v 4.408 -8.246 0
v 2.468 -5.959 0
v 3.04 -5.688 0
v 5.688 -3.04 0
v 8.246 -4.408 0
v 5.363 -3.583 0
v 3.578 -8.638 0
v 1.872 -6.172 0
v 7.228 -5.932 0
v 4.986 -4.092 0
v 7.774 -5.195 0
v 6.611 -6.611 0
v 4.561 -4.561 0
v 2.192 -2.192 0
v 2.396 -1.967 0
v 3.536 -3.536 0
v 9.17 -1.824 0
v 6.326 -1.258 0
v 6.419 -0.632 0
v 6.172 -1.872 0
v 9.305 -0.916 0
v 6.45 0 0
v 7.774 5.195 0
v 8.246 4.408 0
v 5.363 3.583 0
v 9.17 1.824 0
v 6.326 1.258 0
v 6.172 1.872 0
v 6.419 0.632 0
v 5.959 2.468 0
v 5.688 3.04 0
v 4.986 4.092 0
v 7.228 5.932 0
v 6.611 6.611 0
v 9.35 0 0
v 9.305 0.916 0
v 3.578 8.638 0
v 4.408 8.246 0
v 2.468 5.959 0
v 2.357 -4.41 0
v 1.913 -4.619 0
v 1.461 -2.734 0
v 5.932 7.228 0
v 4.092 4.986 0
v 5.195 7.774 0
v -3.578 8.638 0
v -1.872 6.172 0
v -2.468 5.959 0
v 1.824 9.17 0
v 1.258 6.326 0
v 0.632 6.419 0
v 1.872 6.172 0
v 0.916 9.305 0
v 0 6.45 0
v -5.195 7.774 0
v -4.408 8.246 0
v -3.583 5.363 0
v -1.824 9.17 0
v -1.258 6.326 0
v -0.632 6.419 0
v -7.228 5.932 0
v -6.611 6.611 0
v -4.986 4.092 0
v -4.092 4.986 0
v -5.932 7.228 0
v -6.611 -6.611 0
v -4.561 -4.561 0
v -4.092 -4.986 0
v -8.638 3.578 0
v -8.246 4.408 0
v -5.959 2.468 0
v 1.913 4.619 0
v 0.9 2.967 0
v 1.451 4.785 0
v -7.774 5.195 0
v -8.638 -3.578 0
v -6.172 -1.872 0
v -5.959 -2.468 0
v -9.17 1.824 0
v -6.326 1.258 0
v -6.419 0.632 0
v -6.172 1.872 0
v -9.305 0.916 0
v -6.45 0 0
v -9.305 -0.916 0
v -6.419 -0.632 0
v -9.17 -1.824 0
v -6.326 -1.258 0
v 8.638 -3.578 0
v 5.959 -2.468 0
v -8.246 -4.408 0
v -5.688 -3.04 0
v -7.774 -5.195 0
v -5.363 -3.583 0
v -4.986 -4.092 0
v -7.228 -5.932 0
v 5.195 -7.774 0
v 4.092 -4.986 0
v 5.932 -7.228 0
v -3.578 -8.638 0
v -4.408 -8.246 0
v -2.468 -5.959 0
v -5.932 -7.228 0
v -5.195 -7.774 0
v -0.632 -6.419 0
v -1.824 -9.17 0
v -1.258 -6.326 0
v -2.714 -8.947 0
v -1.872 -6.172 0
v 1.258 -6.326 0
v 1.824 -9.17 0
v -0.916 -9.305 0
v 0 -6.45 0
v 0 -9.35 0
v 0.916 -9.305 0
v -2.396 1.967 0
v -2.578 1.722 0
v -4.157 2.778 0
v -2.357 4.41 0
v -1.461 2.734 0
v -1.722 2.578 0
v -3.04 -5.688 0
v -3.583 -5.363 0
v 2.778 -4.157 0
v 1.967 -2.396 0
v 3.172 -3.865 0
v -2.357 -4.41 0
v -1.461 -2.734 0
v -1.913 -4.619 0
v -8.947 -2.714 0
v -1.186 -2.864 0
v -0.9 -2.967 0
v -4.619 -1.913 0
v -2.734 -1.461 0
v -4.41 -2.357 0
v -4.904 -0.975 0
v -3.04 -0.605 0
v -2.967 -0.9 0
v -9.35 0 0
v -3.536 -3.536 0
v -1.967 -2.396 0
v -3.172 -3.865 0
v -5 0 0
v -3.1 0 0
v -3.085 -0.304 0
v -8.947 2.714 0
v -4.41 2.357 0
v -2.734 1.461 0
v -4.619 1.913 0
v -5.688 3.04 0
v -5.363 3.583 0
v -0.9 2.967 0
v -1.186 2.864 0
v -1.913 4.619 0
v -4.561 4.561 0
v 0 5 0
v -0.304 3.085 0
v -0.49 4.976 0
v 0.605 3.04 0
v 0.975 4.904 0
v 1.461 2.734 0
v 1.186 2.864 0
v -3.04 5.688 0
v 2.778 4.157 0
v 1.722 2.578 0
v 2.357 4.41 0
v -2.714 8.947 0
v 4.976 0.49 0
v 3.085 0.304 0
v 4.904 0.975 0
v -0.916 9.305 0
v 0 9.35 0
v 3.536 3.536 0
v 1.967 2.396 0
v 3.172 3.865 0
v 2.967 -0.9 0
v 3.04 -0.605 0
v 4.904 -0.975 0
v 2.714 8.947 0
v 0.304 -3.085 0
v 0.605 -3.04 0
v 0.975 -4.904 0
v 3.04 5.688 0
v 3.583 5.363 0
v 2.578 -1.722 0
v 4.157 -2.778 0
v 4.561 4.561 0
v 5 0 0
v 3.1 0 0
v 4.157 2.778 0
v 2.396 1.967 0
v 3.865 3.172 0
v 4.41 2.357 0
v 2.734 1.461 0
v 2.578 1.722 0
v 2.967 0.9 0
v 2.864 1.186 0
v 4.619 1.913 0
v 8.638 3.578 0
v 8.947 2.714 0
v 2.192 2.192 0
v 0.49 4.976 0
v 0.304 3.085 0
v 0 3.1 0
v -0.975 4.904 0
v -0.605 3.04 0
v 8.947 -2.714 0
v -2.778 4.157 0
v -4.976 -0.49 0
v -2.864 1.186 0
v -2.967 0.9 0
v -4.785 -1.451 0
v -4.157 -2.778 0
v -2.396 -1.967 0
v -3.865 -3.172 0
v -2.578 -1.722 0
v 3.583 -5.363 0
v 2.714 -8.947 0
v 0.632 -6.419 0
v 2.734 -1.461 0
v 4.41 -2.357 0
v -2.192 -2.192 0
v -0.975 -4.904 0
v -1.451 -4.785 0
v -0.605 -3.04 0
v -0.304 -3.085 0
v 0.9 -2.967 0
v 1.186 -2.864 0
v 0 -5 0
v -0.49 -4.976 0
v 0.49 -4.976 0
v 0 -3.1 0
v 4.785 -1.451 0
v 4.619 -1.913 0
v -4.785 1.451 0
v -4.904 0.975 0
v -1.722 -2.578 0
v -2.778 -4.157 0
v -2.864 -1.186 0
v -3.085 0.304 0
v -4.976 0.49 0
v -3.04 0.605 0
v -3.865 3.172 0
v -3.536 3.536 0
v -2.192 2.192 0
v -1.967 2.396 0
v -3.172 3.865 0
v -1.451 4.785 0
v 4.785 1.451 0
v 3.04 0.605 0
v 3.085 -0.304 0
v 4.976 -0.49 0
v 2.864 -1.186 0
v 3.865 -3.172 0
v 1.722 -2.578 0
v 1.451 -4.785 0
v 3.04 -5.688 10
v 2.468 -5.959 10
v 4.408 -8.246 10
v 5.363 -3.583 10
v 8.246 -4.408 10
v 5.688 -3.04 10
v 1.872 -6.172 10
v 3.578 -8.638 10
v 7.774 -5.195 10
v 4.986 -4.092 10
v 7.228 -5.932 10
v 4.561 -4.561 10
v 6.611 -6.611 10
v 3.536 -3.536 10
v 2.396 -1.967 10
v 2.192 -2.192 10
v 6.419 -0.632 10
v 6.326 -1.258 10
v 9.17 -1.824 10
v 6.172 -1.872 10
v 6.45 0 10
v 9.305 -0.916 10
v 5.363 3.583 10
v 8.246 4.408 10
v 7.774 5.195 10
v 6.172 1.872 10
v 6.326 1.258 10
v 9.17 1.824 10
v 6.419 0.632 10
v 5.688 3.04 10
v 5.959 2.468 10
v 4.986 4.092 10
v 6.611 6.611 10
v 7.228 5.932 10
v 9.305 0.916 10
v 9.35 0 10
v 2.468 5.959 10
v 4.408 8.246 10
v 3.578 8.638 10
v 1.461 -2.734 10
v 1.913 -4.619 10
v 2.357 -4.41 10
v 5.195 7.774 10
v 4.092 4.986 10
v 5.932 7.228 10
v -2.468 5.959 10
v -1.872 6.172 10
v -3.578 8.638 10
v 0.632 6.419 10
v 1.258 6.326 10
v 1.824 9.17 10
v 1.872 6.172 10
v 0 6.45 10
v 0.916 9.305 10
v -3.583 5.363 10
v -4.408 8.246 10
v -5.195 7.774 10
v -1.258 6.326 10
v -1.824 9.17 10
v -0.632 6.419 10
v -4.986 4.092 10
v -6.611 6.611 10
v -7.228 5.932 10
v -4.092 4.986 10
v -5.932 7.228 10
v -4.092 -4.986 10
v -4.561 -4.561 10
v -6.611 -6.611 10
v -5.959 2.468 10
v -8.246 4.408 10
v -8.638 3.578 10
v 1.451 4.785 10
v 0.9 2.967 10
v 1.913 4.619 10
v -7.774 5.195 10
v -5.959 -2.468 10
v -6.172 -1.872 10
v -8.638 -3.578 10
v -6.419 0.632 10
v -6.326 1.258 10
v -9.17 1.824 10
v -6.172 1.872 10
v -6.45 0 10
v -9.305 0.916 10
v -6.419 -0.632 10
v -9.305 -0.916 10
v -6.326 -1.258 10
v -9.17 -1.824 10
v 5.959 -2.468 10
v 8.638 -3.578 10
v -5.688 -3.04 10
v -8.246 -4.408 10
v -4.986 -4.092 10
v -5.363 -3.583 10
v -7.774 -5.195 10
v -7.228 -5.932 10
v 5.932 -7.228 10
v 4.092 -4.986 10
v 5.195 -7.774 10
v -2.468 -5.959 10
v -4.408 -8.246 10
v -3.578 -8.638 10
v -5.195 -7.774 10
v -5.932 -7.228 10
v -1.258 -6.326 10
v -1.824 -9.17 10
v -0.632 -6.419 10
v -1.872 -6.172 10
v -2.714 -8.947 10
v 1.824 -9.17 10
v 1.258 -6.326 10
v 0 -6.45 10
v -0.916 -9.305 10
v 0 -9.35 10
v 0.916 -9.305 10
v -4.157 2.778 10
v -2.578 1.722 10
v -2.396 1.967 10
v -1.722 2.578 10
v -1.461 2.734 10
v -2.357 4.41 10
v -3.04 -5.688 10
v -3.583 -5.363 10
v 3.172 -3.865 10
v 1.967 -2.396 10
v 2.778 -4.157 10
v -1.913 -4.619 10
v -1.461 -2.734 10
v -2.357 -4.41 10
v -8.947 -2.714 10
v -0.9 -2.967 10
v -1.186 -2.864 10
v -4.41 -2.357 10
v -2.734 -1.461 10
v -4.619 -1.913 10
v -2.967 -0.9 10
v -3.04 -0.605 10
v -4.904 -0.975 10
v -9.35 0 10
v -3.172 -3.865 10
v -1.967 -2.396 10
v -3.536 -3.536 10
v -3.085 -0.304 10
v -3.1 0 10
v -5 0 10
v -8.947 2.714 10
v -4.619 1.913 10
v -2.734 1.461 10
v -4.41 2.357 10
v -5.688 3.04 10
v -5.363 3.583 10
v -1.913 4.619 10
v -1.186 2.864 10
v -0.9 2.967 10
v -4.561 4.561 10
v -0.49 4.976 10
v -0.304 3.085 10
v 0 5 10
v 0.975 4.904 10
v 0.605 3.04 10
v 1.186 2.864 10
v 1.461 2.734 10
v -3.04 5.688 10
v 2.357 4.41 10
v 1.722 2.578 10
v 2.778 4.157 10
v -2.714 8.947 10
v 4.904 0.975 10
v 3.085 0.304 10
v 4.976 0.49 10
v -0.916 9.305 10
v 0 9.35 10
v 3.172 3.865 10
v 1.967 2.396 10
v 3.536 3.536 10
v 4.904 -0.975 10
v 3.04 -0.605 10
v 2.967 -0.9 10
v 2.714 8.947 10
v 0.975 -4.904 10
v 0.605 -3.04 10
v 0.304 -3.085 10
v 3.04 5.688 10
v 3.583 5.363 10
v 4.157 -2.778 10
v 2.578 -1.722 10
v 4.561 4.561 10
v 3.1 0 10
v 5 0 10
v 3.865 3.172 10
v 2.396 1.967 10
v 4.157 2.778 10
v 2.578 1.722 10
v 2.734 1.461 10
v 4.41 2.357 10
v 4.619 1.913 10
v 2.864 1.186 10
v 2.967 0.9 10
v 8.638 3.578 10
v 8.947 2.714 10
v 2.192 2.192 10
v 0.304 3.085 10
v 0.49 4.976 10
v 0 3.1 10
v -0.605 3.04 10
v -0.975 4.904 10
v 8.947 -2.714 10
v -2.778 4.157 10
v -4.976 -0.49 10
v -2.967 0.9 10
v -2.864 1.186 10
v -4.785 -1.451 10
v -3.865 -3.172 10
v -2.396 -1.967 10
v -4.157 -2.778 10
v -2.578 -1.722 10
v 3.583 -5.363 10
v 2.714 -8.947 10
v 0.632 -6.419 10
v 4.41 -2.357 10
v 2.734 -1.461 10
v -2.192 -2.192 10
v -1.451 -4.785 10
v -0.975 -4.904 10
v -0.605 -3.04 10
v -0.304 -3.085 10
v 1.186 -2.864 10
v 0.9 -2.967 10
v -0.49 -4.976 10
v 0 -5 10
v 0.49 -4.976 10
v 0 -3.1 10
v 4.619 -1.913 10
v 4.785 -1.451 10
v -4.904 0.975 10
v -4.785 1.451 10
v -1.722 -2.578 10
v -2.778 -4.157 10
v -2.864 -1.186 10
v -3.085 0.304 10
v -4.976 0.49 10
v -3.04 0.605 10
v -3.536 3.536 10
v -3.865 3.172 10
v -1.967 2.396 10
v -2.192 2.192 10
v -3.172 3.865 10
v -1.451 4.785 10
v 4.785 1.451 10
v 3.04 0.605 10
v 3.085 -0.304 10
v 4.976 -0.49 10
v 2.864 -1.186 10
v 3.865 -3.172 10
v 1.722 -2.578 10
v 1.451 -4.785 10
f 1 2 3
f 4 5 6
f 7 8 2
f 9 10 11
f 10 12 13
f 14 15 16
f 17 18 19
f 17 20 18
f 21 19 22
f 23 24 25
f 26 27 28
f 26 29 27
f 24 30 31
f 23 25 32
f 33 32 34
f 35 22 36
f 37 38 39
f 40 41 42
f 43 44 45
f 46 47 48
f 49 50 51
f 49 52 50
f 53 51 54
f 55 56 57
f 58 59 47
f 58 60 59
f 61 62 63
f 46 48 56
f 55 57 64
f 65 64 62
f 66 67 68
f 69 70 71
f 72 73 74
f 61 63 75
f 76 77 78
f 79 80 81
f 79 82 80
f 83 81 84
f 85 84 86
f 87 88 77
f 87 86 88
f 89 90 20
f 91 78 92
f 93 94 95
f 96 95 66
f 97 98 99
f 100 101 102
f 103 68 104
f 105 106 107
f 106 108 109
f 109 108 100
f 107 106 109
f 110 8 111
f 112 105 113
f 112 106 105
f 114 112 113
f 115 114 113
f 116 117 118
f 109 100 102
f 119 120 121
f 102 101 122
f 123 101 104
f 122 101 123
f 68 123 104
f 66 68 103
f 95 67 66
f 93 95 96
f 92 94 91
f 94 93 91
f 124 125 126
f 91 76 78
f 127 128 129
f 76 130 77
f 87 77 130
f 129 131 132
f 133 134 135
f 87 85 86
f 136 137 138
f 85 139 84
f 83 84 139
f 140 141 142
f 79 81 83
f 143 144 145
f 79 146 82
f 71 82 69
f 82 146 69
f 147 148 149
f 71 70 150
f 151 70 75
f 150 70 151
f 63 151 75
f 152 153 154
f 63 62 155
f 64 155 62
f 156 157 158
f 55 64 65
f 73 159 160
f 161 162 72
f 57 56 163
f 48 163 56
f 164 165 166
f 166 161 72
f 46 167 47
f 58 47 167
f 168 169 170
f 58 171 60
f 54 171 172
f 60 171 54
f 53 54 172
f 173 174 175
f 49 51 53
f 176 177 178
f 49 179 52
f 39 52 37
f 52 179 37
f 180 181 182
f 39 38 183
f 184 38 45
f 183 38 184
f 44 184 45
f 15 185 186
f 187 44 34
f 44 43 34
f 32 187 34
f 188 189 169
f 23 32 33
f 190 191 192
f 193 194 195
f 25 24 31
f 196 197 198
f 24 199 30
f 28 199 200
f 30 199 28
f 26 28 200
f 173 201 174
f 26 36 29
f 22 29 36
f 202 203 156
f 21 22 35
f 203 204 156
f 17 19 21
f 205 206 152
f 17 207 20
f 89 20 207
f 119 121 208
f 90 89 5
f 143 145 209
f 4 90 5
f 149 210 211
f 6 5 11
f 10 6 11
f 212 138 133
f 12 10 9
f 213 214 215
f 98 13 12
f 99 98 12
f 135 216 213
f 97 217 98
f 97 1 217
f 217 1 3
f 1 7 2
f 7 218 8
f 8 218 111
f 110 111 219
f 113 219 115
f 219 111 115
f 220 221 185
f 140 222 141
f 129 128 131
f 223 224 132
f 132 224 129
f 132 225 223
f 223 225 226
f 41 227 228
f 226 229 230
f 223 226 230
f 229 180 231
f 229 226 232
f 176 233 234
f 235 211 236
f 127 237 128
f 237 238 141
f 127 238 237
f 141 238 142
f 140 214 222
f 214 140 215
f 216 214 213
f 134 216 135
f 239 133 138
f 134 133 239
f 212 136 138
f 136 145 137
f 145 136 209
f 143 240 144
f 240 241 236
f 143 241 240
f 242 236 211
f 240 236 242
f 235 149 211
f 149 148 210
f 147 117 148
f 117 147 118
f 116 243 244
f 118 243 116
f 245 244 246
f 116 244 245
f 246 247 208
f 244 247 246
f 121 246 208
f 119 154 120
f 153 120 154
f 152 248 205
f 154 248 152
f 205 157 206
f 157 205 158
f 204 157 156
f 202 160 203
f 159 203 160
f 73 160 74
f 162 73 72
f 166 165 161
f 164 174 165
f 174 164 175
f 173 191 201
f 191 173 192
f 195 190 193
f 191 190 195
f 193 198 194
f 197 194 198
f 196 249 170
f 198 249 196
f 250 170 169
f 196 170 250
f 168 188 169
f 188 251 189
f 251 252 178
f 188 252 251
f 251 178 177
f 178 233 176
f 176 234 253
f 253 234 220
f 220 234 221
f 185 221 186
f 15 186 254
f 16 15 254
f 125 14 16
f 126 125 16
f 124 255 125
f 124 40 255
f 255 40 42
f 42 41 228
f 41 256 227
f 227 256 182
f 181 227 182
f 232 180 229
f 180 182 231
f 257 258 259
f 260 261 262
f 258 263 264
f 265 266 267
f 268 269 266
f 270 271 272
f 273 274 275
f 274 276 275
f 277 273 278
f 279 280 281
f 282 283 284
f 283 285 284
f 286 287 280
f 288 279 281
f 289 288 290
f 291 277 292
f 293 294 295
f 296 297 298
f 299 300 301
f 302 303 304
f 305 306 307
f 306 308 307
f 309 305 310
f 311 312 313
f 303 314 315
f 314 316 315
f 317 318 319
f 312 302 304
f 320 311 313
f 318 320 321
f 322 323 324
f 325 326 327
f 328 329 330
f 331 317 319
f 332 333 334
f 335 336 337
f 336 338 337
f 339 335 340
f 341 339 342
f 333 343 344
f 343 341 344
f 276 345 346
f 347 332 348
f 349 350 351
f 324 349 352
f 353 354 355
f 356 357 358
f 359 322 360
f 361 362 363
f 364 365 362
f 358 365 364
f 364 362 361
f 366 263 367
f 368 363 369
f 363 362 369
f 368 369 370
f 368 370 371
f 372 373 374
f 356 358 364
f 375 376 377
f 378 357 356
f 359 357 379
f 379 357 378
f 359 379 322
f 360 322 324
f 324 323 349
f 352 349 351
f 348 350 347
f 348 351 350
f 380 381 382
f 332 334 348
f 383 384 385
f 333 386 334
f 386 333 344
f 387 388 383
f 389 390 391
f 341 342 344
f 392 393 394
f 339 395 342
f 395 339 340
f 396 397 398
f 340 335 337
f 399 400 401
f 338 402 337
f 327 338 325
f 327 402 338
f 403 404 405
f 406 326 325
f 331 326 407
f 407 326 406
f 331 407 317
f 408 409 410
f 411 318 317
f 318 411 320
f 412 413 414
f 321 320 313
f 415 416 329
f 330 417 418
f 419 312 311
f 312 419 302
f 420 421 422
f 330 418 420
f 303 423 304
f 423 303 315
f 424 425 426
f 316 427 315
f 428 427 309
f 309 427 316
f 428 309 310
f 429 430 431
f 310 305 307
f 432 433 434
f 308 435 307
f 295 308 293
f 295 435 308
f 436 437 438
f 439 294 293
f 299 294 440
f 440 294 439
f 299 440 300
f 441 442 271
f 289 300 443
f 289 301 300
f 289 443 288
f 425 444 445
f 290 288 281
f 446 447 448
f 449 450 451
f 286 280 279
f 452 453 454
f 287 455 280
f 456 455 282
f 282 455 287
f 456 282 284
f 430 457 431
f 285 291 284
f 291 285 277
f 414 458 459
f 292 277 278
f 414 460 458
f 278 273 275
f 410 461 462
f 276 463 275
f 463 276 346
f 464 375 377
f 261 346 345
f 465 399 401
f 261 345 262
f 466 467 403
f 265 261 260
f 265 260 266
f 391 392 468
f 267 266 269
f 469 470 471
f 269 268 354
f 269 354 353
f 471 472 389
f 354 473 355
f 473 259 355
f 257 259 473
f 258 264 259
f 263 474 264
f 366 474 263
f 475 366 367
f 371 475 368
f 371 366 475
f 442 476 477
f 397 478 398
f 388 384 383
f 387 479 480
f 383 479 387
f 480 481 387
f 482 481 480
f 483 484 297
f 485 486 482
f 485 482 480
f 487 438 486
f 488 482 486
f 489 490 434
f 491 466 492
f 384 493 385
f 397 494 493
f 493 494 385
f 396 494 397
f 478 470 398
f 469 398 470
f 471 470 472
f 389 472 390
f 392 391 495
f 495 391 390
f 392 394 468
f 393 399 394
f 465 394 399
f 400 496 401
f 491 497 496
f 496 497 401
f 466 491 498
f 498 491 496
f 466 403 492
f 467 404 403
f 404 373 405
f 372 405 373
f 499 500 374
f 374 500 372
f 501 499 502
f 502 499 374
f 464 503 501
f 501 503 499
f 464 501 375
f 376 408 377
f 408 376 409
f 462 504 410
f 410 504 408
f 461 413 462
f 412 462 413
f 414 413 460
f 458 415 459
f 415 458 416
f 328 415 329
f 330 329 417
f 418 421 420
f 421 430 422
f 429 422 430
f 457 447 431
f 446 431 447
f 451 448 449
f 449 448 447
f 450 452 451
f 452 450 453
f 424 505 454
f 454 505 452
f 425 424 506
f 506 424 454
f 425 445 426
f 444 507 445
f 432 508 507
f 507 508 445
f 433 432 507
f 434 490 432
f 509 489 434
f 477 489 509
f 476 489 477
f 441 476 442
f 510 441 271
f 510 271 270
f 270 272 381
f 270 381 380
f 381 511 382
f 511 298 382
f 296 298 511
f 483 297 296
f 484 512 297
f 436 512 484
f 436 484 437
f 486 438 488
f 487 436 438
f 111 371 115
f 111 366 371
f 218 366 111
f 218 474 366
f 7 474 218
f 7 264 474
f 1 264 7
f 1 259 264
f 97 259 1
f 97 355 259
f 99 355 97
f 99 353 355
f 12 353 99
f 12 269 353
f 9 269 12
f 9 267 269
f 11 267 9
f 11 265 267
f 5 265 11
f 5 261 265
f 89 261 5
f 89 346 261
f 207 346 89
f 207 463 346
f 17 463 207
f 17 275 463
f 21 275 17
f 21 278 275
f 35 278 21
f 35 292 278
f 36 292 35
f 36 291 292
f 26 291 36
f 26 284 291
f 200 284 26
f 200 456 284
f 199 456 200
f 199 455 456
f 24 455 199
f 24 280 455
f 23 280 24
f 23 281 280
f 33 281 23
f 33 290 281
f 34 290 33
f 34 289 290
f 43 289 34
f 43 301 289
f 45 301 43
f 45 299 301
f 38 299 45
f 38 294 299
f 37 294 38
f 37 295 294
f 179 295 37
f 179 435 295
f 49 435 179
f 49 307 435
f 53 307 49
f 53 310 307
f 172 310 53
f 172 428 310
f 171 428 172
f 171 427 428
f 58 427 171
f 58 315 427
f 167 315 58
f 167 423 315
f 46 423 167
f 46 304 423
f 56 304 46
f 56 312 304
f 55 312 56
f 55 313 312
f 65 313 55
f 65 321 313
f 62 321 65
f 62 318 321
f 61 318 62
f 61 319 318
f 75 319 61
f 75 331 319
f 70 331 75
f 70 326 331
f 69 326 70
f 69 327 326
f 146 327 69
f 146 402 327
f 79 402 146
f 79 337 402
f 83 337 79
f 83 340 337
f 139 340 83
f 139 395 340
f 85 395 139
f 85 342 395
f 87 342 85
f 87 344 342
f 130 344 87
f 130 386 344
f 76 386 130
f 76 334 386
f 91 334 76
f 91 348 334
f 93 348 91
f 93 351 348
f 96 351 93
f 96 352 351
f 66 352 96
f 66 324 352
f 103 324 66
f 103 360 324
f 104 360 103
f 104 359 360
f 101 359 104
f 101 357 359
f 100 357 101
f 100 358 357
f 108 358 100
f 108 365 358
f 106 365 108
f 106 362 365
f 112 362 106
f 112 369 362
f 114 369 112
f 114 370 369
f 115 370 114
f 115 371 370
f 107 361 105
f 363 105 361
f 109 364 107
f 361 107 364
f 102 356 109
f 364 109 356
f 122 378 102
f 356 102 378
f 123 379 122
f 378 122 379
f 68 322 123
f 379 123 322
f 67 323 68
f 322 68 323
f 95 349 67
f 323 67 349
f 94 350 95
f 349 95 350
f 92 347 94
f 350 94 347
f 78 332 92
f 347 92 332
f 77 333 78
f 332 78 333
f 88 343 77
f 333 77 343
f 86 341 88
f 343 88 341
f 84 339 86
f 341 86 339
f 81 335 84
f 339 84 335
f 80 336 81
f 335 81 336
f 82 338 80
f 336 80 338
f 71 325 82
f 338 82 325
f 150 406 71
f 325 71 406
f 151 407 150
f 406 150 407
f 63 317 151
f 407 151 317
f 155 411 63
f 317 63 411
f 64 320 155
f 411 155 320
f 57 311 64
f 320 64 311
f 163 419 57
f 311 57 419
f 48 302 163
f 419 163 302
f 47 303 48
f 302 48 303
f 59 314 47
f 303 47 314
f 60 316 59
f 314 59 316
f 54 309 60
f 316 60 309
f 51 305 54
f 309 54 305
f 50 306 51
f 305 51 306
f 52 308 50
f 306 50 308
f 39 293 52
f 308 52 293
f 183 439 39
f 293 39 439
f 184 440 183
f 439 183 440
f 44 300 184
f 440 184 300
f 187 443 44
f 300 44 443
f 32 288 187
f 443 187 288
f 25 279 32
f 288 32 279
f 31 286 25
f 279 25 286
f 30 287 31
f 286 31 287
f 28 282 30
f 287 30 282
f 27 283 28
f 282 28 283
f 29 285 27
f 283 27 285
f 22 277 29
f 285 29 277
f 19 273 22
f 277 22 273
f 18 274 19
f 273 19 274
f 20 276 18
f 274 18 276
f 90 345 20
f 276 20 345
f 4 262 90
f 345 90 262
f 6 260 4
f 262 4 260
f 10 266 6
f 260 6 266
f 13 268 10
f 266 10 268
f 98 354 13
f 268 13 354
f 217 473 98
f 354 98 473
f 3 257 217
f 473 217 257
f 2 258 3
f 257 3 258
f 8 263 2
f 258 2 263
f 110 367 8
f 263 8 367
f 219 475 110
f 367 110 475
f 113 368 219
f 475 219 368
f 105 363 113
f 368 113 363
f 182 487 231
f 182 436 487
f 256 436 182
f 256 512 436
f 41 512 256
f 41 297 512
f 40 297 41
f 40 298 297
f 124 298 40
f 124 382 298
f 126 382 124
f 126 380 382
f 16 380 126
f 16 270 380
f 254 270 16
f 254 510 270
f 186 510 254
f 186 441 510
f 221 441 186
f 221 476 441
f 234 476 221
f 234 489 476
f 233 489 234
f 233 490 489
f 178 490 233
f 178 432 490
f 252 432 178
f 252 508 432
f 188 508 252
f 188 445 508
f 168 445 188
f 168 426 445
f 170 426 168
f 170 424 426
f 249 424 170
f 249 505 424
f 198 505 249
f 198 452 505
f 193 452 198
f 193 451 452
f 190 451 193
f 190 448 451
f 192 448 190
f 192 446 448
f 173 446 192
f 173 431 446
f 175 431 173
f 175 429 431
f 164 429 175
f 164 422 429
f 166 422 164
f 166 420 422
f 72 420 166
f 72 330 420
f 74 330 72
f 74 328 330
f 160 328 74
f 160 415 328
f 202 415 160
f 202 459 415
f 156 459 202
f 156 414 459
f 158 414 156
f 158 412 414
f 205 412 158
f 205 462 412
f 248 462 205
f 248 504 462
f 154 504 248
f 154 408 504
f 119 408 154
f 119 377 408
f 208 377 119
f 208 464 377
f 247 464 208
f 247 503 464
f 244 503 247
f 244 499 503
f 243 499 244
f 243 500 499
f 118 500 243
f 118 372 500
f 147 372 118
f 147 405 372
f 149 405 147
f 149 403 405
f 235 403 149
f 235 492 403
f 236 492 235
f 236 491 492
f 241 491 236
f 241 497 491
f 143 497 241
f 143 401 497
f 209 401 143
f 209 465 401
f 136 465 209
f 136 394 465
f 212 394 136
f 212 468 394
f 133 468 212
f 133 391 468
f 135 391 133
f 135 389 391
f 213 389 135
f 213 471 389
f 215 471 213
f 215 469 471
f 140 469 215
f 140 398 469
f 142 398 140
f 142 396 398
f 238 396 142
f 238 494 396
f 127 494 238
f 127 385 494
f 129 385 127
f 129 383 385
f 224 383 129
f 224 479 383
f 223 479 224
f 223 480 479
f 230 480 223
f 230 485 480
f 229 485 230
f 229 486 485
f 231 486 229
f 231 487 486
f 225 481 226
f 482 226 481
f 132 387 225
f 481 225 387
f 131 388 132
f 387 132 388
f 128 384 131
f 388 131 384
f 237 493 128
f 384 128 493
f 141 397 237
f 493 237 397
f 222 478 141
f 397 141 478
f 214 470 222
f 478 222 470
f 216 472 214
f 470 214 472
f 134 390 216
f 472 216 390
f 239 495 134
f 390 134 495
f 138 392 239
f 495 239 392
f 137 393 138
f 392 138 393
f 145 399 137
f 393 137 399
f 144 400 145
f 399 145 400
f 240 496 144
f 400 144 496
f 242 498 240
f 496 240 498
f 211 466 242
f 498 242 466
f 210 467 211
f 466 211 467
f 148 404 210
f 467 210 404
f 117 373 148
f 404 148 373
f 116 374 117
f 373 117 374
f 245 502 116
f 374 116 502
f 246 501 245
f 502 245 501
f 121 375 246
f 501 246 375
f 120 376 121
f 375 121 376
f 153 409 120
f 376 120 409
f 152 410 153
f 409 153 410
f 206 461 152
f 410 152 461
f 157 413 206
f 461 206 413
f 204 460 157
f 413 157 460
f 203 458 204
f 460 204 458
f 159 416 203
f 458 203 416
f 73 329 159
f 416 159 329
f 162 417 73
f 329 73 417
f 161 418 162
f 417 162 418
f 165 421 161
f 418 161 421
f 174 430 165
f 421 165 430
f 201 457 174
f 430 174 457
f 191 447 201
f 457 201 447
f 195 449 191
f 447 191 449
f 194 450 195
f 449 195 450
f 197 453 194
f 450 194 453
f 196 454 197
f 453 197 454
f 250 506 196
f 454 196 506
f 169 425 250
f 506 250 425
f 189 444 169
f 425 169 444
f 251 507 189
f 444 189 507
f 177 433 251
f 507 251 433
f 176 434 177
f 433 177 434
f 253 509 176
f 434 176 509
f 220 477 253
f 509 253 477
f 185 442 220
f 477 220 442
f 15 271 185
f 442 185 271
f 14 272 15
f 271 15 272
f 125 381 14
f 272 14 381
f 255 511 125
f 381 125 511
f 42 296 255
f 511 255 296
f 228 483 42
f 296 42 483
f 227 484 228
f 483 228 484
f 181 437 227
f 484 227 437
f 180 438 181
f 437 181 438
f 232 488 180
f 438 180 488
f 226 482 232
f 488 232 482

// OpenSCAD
// Snap-on Clip for Lab Stand Rod and Tubing

// Global settings
$fn = 64;

// Dimensions based on user input (in mm)
clip_height = 10;       // Total height of the clip extrusion (Z dimension)

// Rod Ring Dimensions (for 12.7mm rod)
rod_inner_diameter = 12.7; // Inner diameter for the lab stand rod
rod_wall_thickness = 3;    // Wall thickness of the ring
rod_outer_diameter = rod_inner_diameter + 2 * rod_wall_thickness; // Outer diameter (18.7mm)

// Rod Ring Cutout Dimensions
rod_cutout_width = 10;     // Width of the opening cut on the -X side
rod_cutout_y_range = 5;    // Y range for the cutout (-5 to 5)

// Tubing Ring Dimensions (for tubing)
tubing_inner_diameter = 6; // Inner diameter for the tubing
tubing_wall_thickness = 2;  // Wall thickness of the ring
tubing_outer_diameter = tubing_inner_diameter + 2 * tubing_wall_thickness; // Outer diameter (10mm)

// Tubing Ring Position and Cutout
tubing_center_x = 15;      // X position of the tubing ring center
tubing_cutout_width = 4.5;  // Width of the opening cut on the +X side
tubing_cutout_y_range = 2.25; // Y range for the cutout (-2.25 to 2.25)

// Bridge Dimensions
bridge_width_y = 6;       // Width in Y direction
bridge_start_x = 8;       // Start X coordinate of the bridge
bridge_end_x = 12;        // End X coordinate of the bridge


// --- Module Definitions ---

// Creates a hollow ring shape centered at (cx, cy)
module create_ring(inner_d, outer_d, cx, cy) {
    difference() {
        circle(r = outer_d / 2, center = [cx, cy]);
        // Cutout slightly larger than inner diameter to ensure clean hole
        circle(r = inner_d / 2 + 0.1, center = [cx, cy]); 
    }
}

// --- Component Construction (2D Profile) ---

module rod_ring() {
    // Base ring centered at origin
    create_ring(rod_inner_diameter, rod_outer_diameter, 0, 0);

    // Cutout on the -X side to snap onto the rod.
    // The cutout must be positioned such that its center is placed correctly relative to the outer edge.
    cutout_center_x = -(rod_outer_diameter / 2) + (rod_cutout_width / 2);
    translate([cutout_center_x, 0, 0]) {
        difference() {
            // The cube must be large enough to cut through the ring material.
            cube([rod_cutout_width + 0.1, 2 * rod_cutout_y_range + 0.2, 0.1]);
            // Translate cutout vertically so it is centered around Y=0 relative to its own center point (which is at y=0 here)
            translate([0, -rod_cutout_y_range]) {
                cube([rod_cutout_width + 0.1, 2 * rod_cutout_y_range + 0.2, 0.1]);
            }
        }
    }
}

module tubing_ring() {
    // Base ring centered at (tubing_center_x, 0)
    create_ring(tubing_inner_diameter, tubing_outer_diameter, tubing_center_x, 0);

    // Cutout on the +X side to allow tubing passage.
    cutout_center_x = tubing_center_x + (tubing_outer_diameter / 2) - (tubing_cutout_width / 2);
    translate([cutout_center_x, 0, 0]) {
        difference() {
            // The cube must be large enough to cut through the ring material.
            cube([tubing_cutout_width + 0.1, 2 * tubing_cutout_y_range + 0.2, 0.1]);
             // Translate cutout vertically so it is centered around Y=0 relative to its own center point (which is at y=0 here)
            translate([0, -tubing_cutout_y_range]) {
                cube([tubing_cutout_width + 0.1, 2 * tubing_cutout_y_range + 0.2, 0.1]);
            }
        }
    }
}

module bridge() {
    // Solid rectangular bridge connecting the two rings
    cube([bridge_end_x - bridge_start_x, bridge_width_y, 0.1]); // Thickness of the bridge profile
    translate([bridge_start_x, 0, 0]);
}


// --- Final Assembly (2D Profile) ---

module clip_profile() {
    union() {
        rod_ring();
        tubing_ring();
        bridge();
    }
}

// Extrude the final profile to create the 3D part
difference() {
    // Main body extrusion
    linear_extrude(height = clip_height) {
        clip_profile();
    }
}
